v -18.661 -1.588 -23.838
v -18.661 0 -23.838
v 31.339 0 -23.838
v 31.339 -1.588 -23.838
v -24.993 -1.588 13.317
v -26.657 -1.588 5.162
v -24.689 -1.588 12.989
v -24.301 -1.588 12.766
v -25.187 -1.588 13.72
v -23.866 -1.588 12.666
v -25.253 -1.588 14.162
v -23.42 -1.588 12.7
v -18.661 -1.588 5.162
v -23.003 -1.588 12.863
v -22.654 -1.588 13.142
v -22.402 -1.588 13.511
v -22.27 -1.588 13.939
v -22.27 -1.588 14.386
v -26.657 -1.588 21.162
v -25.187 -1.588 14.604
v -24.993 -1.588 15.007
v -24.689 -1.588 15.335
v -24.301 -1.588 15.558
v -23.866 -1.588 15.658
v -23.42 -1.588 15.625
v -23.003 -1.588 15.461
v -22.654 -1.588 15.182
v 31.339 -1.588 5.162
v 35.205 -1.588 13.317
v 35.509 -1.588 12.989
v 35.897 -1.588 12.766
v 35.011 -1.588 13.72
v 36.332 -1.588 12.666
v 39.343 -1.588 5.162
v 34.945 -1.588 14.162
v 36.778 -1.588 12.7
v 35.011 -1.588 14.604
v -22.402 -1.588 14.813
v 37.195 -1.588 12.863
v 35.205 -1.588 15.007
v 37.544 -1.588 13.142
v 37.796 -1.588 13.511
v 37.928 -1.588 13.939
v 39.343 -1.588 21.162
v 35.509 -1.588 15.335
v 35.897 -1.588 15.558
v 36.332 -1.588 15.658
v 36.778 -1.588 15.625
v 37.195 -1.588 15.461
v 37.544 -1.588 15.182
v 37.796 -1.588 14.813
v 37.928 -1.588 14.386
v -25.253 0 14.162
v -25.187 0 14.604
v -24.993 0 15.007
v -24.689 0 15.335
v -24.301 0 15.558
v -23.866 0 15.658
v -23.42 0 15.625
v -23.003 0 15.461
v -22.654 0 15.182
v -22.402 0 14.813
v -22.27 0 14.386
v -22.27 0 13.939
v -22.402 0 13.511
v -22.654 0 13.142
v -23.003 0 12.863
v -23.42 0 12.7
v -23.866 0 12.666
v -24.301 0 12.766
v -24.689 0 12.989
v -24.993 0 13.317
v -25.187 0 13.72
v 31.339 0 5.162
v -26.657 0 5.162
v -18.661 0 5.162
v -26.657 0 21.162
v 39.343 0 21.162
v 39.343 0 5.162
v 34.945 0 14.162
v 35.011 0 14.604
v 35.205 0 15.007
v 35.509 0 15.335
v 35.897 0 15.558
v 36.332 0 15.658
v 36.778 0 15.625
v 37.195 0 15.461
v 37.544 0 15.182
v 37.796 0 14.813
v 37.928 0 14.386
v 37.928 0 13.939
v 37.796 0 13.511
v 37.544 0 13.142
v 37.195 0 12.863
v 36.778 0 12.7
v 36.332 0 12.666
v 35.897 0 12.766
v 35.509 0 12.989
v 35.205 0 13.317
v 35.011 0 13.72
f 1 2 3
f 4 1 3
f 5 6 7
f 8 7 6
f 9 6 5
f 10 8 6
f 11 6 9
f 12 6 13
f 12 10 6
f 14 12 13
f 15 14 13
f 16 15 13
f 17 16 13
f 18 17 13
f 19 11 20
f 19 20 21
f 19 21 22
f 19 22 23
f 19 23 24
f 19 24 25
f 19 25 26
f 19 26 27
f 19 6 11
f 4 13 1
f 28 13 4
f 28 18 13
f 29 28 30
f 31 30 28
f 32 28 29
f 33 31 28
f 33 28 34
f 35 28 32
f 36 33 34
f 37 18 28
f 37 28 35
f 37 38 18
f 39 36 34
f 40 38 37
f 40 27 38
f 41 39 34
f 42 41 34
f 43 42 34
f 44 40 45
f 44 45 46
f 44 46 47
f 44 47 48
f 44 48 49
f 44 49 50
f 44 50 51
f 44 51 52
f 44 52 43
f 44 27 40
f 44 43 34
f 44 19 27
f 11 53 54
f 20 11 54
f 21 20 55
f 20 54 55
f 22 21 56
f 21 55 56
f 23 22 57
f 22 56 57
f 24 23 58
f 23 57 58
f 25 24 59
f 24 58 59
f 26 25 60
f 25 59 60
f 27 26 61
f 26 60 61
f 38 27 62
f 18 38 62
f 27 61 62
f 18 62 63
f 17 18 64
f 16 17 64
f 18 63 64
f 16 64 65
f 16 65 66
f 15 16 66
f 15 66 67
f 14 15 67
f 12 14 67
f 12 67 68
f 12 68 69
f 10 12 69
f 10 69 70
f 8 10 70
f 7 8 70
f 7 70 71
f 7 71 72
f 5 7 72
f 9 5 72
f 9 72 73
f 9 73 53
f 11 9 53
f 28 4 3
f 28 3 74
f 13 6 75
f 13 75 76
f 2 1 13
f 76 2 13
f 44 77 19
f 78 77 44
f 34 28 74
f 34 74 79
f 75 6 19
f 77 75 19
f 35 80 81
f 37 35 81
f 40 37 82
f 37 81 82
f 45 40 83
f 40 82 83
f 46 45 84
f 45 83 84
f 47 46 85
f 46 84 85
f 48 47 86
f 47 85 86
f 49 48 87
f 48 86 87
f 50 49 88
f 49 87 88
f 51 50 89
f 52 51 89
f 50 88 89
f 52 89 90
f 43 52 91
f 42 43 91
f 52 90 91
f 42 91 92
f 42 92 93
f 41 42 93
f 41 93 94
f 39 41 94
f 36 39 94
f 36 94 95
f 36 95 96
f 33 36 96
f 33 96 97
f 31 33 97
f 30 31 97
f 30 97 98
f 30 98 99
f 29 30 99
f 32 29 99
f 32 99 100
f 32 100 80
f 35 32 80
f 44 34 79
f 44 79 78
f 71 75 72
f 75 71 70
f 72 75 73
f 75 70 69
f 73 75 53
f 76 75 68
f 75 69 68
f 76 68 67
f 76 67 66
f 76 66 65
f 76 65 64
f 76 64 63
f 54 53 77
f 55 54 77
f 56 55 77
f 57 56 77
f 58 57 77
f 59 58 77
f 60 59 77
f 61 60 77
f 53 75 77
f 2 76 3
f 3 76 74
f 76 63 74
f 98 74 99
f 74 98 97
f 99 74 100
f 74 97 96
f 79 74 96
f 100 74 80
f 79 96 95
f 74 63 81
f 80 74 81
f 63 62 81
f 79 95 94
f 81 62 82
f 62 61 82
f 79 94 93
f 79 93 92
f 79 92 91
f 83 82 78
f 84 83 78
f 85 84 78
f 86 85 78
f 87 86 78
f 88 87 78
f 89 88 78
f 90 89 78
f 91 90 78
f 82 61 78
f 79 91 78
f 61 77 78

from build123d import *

# Parameters (mm, degrees)
F0_W     = 68
F0_H     = 45
F1_DEPTH = 1.5875
F2_W     = 8.9957
F2_H     = 29
F2_W_2   = 9.0043
F3_DEPTH = 25.4
F4_D     = 3
F5_W     = 1
F5_H     = 16
F6_DEPTH = 25.4


with BuildPart() as f1:
    # F0 (on Front) → F1 (new body)
    with BuildSketch(Plane.XZ):
        with Locations((6.343424, -1.337832)):
            Rectangle(F0_W, F0_H)
    extrude(amount=F1_DEPTH)

    # F2 (on face) → F3 (cut)
    with BuildSketch(Plane.XZ.offset(1.5875)):
        with Locations((-23.158726, -9.337832)):
            Rectangle(F2_W, F2_H)
        with Locations((35.841274, -9.337832)):
            Rectangle(F2_W_2, F2_H)
    extrude(amount=-F3_DEPTH, mode=Mode.SUBTRACT)

    # F4 (through all)
    with Locations(Plane.XZ.offset(1.5875)):
        with Locations((-23.753476, 14.162168), (36.444524, 14.162168)):
            Hole(F4_D / 2)

    # F5 (on face) → F6 (cut)
    with BuildSketch(Plane.XZ.offset(1.5875)):
        with Locations((-27.156576, 13.162168)):
            Rectangle(F5_W, F5_H)
        with Locations((39.843424, 13.162168)):
            Rectangle(F5_W, F5_H)
    extrude(amount=-F6_DEPTH, mode=Mode.SUBTRACT)


solid = f1.part
